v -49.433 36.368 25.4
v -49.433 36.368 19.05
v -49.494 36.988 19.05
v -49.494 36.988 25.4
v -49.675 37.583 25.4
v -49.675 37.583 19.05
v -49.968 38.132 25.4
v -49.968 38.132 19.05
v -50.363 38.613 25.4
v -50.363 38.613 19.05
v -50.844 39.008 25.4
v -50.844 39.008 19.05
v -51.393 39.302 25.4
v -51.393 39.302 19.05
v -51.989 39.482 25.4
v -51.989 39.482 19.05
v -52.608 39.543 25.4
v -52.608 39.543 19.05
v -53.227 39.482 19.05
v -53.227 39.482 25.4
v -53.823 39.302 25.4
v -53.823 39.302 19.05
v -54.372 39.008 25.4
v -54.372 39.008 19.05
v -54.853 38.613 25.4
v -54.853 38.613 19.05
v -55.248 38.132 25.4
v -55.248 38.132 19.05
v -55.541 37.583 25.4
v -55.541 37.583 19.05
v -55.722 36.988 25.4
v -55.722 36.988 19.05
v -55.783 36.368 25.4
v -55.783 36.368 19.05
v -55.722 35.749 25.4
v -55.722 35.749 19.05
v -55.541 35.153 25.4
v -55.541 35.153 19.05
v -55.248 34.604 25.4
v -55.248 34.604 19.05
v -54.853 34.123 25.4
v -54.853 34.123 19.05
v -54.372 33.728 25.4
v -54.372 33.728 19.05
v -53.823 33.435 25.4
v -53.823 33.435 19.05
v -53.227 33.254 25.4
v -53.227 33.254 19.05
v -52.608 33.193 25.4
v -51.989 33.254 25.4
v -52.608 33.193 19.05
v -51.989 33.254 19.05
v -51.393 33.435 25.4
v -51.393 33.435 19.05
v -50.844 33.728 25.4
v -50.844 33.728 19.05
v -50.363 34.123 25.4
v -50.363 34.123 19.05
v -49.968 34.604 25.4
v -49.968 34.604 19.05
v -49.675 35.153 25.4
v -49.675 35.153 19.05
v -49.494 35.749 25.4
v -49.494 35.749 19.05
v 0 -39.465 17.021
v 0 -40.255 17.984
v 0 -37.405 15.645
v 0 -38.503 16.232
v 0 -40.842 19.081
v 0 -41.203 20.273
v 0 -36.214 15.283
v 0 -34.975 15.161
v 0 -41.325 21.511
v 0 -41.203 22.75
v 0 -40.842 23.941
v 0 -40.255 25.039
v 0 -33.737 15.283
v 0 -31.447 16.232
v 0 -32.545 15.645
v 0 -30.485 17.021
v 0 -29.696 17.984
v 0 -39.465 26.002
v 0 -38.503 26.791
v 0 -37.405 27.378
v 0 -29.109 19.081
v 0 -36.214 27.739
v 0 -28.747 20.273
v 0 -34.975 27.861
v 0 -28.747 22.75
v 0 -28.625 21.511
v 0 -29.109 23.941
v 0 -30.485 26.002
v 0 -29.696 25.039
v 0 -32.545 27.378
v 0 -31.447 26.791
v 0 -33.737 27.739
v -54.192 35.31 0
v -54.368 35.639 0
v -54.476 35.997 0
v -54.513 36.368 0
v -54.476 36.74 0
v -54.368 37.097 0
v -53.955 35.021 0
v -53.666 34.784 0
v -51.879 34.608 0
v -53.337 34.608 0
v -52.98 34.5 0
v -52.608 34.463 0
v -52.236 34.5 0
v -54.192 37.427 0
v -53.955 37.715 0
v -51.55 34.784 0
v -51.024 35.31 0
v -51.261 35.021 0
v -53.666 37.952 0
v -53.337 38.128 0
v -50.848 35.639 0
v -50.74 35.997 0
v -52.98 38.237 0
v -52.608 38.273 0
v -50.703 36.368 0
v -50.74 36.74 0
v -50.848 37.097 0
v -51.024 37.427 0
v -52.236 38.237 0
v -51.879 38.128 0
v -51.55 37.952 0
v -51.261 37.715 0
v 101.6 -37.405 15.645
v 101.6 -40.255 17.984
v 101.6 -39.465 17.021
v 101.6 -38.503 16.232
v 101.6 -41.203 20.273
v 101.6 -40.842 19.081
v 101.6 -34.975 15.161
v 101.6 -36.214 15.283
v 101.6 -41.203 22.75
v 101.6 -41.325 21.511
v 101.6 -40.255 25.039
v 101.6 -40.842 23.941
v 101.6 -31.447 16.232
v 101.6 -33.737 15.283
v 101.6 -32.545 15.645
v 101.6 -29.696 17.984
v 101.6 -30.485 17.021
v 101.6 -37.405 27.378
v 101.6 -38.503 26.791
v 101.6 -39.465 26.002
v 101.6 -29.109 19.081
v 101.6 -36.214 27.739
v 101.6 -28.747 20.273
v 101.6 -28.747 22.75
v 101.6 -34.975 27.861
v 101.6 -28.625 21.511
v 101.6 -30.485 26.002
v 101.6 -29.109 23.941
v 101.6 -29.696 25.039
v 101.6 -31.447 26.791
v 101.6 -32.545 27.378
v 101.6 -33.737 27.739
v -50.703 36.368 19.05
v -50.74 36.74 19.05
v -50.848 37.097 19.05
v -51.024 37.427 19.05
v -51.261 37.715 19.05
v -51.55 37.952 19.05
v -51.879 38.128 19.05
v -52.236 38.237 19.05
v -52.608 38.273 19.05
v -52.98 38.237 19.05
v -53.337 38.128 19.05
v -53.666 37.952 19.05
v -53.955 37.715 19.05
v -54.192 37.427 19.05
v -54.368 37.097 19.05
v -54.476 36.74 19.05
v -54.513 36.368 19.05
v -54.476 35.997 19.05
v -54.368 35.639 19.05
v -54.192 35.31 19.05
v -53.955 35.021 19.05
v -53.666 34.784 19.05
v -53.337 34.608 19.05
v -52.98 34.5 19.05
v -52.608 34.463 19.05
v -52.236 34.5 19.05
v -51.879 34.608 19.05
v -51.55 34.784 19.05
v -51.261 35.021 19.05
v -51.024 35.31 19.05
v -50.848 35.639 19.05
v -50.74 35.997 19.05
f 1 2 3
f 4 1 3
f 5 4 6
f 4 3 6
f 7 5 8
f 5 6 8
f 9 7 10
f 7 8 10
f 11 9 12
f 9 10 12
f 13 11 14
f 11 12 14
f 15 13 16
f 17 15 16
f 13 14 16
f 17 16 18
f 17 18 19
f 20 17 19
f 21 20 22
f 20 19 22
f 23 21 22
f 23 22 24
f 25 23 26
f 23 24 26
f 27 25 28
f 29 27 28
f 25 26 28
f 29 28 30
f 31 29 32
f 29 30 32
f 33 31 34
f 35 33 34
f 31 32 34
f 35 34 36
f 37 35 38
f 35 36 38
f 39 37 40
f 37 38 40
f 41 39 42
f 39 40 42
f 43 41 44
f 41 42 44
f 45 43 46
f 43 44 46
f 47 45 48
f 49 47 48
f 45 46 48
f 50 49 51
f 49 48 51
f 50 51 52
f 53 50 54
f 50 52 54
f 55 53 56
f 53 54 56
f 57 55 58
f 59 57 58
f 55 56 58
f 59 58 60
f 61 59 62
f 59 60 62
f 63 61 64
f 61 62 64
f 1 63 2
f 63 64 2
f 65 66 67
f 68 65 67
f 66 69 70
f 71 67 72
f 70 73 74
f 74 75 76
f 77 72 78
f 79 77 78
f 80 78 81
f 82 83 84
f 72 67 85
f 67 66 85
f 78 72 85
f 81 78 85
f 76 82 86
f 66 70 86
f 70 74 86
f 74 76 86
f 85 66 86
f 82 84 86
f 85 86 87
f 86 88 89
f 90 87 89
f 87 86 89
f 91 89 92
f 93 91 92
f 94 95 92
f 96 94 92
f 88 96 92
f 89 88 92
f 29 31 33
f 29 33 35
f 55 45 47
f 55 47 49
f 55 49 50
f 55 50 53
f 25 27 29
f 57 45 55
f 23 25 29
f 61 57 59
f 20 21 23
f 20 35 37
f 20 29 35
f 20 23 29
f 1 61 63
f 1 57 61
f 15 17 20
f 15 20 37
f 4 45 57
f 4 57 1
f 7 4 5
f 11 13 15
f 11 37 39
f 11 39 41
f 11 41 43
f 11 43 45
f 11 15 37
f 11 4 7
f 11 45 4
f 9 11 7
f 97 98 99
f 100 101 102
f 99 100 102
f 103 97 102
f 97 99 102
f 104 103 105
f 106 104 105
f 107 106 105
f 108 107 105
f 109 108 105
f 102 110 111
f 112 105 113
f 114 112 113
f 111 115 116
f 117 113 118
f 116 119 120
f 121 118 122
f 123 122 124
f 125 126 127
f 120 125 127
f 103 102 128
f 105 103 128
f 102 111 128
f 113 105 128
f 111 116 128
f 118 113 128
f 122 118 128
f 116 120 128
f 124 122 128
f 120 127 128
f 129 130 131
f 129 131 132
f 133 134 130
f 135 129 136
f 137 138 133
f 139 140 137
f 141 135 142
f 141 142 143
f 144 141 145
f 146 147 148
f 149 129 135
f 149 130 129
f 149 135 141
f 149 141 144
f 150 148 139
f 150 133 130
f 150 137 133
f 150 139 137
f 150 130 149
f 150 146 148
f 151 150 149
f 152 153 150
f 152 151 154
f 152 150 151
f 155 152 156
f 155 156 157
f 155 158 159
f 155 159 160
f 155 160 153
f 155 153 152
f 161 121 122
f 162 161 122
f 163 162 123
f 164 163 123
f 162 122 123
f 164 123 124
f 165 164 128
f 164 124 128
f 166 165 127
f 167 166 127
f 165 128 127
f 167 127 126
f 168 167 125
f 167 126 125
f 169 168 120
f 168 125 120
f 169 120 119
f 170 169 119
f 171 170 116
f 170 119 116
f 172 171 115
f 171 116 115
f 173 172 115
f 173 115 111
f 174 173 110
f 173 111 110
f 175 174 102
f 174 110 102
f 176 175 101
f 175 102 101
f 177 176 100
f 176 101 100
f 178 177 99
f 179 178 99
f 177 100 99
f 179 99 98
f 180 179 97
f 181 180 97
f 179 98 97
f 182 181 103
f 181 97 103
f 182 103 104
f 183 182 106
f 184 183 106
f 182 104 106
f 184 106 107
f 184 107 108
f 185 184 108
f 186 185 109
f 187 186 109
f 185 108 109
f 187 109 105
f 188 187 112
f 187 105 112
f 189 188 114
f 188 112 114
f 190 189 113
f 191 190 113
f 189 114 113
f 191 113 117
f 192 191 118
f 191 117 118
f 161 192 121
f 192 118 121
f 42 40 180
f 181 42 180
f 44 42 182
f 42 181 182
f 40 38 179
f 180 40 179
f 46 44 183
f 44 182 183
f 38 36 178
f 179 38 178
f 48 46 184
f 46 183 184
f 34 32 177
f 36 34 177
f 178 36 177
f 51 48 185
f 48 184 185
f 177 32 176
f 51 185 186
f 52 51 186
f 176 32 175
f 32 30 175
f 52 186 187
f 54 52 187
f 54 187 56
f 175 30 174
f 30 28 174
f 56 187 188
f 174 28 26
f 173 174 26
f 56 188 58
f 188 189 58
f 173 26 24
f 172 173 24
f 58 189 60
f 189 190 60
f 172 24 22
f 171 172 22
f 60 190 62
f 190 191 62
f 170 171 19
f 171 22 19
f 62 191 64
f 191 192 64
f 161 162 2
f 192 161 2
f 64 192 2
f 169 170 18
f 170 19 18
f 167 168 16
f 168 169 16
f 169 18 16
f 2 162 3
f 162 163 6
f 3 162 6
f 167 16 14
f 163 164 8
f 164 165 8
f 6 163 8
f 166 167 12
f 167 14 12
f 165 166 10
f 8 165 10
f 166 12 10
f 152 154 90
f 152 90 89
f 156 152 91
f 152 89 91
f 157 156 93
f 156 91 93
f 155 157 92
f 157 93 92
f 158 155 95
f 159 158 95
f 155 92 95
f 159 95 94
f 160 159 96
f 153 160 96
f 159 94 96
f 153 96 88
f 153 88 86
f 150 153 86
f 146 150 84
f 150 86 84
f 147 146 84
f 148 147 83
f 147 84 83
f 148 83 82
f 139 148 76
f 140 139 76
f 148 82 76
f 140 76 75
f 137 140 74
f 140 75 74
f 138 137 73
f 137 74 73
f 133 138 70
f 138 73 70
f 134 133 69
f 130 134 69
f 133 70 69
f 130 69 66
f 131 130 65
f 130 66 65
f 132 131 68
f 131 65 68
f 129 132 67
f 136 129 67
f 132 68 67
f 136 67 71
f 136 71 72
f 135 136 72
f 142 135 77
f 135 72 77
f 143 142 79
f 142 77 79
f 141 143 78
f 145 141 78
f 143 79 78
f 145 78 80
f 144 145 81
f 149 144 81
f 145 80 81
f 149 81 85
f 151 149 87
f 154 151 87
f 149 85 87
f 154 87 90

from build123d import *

# Parameters (mm, degrees)
F0_R     = 6.35
F1_DEPTH = 101.6
F2_R     = 1.905
F3_DEPTH = 19.05
F4_R     = 3.175
F4_R_2   = 1.905
F5_DEPTH = 6.35


with BuildPart() as f1:
    # F0 (on Right) → F1 (new body)
    with BuildSketch(Plane.YZ):
        with Locations((-34.975357, 21.511393)):
            Circle(F0_R)
    extrude(amount=F1_DEPTH)


with BuildPart() as f3:
    # F2 (on Top) → F3 (new body)
    with BuildSketch(Plane.XY):
        with Locations((-52.607972, 36.368184)):
            Circle(F2_R)
    extrude(amount=F3_DEPTH)

    # F4 (on face) → F5 (join)
    with BuildSketch(Plane.XY.offset(19.05)):
        with Locations((-52.607972, 36.368184)):
            Circle(F4_R)
        with Locations((-52.607972, 36.368184)):
            Circle(F4_R_2, mode=Mode.SUBTRACT)
        with Locations((-52.607972, 36.368184)):
            Circle(F4_R_2)
    extrude(amount=F5_DEPTH)


solid = Compound([f1.part, f3.part])
